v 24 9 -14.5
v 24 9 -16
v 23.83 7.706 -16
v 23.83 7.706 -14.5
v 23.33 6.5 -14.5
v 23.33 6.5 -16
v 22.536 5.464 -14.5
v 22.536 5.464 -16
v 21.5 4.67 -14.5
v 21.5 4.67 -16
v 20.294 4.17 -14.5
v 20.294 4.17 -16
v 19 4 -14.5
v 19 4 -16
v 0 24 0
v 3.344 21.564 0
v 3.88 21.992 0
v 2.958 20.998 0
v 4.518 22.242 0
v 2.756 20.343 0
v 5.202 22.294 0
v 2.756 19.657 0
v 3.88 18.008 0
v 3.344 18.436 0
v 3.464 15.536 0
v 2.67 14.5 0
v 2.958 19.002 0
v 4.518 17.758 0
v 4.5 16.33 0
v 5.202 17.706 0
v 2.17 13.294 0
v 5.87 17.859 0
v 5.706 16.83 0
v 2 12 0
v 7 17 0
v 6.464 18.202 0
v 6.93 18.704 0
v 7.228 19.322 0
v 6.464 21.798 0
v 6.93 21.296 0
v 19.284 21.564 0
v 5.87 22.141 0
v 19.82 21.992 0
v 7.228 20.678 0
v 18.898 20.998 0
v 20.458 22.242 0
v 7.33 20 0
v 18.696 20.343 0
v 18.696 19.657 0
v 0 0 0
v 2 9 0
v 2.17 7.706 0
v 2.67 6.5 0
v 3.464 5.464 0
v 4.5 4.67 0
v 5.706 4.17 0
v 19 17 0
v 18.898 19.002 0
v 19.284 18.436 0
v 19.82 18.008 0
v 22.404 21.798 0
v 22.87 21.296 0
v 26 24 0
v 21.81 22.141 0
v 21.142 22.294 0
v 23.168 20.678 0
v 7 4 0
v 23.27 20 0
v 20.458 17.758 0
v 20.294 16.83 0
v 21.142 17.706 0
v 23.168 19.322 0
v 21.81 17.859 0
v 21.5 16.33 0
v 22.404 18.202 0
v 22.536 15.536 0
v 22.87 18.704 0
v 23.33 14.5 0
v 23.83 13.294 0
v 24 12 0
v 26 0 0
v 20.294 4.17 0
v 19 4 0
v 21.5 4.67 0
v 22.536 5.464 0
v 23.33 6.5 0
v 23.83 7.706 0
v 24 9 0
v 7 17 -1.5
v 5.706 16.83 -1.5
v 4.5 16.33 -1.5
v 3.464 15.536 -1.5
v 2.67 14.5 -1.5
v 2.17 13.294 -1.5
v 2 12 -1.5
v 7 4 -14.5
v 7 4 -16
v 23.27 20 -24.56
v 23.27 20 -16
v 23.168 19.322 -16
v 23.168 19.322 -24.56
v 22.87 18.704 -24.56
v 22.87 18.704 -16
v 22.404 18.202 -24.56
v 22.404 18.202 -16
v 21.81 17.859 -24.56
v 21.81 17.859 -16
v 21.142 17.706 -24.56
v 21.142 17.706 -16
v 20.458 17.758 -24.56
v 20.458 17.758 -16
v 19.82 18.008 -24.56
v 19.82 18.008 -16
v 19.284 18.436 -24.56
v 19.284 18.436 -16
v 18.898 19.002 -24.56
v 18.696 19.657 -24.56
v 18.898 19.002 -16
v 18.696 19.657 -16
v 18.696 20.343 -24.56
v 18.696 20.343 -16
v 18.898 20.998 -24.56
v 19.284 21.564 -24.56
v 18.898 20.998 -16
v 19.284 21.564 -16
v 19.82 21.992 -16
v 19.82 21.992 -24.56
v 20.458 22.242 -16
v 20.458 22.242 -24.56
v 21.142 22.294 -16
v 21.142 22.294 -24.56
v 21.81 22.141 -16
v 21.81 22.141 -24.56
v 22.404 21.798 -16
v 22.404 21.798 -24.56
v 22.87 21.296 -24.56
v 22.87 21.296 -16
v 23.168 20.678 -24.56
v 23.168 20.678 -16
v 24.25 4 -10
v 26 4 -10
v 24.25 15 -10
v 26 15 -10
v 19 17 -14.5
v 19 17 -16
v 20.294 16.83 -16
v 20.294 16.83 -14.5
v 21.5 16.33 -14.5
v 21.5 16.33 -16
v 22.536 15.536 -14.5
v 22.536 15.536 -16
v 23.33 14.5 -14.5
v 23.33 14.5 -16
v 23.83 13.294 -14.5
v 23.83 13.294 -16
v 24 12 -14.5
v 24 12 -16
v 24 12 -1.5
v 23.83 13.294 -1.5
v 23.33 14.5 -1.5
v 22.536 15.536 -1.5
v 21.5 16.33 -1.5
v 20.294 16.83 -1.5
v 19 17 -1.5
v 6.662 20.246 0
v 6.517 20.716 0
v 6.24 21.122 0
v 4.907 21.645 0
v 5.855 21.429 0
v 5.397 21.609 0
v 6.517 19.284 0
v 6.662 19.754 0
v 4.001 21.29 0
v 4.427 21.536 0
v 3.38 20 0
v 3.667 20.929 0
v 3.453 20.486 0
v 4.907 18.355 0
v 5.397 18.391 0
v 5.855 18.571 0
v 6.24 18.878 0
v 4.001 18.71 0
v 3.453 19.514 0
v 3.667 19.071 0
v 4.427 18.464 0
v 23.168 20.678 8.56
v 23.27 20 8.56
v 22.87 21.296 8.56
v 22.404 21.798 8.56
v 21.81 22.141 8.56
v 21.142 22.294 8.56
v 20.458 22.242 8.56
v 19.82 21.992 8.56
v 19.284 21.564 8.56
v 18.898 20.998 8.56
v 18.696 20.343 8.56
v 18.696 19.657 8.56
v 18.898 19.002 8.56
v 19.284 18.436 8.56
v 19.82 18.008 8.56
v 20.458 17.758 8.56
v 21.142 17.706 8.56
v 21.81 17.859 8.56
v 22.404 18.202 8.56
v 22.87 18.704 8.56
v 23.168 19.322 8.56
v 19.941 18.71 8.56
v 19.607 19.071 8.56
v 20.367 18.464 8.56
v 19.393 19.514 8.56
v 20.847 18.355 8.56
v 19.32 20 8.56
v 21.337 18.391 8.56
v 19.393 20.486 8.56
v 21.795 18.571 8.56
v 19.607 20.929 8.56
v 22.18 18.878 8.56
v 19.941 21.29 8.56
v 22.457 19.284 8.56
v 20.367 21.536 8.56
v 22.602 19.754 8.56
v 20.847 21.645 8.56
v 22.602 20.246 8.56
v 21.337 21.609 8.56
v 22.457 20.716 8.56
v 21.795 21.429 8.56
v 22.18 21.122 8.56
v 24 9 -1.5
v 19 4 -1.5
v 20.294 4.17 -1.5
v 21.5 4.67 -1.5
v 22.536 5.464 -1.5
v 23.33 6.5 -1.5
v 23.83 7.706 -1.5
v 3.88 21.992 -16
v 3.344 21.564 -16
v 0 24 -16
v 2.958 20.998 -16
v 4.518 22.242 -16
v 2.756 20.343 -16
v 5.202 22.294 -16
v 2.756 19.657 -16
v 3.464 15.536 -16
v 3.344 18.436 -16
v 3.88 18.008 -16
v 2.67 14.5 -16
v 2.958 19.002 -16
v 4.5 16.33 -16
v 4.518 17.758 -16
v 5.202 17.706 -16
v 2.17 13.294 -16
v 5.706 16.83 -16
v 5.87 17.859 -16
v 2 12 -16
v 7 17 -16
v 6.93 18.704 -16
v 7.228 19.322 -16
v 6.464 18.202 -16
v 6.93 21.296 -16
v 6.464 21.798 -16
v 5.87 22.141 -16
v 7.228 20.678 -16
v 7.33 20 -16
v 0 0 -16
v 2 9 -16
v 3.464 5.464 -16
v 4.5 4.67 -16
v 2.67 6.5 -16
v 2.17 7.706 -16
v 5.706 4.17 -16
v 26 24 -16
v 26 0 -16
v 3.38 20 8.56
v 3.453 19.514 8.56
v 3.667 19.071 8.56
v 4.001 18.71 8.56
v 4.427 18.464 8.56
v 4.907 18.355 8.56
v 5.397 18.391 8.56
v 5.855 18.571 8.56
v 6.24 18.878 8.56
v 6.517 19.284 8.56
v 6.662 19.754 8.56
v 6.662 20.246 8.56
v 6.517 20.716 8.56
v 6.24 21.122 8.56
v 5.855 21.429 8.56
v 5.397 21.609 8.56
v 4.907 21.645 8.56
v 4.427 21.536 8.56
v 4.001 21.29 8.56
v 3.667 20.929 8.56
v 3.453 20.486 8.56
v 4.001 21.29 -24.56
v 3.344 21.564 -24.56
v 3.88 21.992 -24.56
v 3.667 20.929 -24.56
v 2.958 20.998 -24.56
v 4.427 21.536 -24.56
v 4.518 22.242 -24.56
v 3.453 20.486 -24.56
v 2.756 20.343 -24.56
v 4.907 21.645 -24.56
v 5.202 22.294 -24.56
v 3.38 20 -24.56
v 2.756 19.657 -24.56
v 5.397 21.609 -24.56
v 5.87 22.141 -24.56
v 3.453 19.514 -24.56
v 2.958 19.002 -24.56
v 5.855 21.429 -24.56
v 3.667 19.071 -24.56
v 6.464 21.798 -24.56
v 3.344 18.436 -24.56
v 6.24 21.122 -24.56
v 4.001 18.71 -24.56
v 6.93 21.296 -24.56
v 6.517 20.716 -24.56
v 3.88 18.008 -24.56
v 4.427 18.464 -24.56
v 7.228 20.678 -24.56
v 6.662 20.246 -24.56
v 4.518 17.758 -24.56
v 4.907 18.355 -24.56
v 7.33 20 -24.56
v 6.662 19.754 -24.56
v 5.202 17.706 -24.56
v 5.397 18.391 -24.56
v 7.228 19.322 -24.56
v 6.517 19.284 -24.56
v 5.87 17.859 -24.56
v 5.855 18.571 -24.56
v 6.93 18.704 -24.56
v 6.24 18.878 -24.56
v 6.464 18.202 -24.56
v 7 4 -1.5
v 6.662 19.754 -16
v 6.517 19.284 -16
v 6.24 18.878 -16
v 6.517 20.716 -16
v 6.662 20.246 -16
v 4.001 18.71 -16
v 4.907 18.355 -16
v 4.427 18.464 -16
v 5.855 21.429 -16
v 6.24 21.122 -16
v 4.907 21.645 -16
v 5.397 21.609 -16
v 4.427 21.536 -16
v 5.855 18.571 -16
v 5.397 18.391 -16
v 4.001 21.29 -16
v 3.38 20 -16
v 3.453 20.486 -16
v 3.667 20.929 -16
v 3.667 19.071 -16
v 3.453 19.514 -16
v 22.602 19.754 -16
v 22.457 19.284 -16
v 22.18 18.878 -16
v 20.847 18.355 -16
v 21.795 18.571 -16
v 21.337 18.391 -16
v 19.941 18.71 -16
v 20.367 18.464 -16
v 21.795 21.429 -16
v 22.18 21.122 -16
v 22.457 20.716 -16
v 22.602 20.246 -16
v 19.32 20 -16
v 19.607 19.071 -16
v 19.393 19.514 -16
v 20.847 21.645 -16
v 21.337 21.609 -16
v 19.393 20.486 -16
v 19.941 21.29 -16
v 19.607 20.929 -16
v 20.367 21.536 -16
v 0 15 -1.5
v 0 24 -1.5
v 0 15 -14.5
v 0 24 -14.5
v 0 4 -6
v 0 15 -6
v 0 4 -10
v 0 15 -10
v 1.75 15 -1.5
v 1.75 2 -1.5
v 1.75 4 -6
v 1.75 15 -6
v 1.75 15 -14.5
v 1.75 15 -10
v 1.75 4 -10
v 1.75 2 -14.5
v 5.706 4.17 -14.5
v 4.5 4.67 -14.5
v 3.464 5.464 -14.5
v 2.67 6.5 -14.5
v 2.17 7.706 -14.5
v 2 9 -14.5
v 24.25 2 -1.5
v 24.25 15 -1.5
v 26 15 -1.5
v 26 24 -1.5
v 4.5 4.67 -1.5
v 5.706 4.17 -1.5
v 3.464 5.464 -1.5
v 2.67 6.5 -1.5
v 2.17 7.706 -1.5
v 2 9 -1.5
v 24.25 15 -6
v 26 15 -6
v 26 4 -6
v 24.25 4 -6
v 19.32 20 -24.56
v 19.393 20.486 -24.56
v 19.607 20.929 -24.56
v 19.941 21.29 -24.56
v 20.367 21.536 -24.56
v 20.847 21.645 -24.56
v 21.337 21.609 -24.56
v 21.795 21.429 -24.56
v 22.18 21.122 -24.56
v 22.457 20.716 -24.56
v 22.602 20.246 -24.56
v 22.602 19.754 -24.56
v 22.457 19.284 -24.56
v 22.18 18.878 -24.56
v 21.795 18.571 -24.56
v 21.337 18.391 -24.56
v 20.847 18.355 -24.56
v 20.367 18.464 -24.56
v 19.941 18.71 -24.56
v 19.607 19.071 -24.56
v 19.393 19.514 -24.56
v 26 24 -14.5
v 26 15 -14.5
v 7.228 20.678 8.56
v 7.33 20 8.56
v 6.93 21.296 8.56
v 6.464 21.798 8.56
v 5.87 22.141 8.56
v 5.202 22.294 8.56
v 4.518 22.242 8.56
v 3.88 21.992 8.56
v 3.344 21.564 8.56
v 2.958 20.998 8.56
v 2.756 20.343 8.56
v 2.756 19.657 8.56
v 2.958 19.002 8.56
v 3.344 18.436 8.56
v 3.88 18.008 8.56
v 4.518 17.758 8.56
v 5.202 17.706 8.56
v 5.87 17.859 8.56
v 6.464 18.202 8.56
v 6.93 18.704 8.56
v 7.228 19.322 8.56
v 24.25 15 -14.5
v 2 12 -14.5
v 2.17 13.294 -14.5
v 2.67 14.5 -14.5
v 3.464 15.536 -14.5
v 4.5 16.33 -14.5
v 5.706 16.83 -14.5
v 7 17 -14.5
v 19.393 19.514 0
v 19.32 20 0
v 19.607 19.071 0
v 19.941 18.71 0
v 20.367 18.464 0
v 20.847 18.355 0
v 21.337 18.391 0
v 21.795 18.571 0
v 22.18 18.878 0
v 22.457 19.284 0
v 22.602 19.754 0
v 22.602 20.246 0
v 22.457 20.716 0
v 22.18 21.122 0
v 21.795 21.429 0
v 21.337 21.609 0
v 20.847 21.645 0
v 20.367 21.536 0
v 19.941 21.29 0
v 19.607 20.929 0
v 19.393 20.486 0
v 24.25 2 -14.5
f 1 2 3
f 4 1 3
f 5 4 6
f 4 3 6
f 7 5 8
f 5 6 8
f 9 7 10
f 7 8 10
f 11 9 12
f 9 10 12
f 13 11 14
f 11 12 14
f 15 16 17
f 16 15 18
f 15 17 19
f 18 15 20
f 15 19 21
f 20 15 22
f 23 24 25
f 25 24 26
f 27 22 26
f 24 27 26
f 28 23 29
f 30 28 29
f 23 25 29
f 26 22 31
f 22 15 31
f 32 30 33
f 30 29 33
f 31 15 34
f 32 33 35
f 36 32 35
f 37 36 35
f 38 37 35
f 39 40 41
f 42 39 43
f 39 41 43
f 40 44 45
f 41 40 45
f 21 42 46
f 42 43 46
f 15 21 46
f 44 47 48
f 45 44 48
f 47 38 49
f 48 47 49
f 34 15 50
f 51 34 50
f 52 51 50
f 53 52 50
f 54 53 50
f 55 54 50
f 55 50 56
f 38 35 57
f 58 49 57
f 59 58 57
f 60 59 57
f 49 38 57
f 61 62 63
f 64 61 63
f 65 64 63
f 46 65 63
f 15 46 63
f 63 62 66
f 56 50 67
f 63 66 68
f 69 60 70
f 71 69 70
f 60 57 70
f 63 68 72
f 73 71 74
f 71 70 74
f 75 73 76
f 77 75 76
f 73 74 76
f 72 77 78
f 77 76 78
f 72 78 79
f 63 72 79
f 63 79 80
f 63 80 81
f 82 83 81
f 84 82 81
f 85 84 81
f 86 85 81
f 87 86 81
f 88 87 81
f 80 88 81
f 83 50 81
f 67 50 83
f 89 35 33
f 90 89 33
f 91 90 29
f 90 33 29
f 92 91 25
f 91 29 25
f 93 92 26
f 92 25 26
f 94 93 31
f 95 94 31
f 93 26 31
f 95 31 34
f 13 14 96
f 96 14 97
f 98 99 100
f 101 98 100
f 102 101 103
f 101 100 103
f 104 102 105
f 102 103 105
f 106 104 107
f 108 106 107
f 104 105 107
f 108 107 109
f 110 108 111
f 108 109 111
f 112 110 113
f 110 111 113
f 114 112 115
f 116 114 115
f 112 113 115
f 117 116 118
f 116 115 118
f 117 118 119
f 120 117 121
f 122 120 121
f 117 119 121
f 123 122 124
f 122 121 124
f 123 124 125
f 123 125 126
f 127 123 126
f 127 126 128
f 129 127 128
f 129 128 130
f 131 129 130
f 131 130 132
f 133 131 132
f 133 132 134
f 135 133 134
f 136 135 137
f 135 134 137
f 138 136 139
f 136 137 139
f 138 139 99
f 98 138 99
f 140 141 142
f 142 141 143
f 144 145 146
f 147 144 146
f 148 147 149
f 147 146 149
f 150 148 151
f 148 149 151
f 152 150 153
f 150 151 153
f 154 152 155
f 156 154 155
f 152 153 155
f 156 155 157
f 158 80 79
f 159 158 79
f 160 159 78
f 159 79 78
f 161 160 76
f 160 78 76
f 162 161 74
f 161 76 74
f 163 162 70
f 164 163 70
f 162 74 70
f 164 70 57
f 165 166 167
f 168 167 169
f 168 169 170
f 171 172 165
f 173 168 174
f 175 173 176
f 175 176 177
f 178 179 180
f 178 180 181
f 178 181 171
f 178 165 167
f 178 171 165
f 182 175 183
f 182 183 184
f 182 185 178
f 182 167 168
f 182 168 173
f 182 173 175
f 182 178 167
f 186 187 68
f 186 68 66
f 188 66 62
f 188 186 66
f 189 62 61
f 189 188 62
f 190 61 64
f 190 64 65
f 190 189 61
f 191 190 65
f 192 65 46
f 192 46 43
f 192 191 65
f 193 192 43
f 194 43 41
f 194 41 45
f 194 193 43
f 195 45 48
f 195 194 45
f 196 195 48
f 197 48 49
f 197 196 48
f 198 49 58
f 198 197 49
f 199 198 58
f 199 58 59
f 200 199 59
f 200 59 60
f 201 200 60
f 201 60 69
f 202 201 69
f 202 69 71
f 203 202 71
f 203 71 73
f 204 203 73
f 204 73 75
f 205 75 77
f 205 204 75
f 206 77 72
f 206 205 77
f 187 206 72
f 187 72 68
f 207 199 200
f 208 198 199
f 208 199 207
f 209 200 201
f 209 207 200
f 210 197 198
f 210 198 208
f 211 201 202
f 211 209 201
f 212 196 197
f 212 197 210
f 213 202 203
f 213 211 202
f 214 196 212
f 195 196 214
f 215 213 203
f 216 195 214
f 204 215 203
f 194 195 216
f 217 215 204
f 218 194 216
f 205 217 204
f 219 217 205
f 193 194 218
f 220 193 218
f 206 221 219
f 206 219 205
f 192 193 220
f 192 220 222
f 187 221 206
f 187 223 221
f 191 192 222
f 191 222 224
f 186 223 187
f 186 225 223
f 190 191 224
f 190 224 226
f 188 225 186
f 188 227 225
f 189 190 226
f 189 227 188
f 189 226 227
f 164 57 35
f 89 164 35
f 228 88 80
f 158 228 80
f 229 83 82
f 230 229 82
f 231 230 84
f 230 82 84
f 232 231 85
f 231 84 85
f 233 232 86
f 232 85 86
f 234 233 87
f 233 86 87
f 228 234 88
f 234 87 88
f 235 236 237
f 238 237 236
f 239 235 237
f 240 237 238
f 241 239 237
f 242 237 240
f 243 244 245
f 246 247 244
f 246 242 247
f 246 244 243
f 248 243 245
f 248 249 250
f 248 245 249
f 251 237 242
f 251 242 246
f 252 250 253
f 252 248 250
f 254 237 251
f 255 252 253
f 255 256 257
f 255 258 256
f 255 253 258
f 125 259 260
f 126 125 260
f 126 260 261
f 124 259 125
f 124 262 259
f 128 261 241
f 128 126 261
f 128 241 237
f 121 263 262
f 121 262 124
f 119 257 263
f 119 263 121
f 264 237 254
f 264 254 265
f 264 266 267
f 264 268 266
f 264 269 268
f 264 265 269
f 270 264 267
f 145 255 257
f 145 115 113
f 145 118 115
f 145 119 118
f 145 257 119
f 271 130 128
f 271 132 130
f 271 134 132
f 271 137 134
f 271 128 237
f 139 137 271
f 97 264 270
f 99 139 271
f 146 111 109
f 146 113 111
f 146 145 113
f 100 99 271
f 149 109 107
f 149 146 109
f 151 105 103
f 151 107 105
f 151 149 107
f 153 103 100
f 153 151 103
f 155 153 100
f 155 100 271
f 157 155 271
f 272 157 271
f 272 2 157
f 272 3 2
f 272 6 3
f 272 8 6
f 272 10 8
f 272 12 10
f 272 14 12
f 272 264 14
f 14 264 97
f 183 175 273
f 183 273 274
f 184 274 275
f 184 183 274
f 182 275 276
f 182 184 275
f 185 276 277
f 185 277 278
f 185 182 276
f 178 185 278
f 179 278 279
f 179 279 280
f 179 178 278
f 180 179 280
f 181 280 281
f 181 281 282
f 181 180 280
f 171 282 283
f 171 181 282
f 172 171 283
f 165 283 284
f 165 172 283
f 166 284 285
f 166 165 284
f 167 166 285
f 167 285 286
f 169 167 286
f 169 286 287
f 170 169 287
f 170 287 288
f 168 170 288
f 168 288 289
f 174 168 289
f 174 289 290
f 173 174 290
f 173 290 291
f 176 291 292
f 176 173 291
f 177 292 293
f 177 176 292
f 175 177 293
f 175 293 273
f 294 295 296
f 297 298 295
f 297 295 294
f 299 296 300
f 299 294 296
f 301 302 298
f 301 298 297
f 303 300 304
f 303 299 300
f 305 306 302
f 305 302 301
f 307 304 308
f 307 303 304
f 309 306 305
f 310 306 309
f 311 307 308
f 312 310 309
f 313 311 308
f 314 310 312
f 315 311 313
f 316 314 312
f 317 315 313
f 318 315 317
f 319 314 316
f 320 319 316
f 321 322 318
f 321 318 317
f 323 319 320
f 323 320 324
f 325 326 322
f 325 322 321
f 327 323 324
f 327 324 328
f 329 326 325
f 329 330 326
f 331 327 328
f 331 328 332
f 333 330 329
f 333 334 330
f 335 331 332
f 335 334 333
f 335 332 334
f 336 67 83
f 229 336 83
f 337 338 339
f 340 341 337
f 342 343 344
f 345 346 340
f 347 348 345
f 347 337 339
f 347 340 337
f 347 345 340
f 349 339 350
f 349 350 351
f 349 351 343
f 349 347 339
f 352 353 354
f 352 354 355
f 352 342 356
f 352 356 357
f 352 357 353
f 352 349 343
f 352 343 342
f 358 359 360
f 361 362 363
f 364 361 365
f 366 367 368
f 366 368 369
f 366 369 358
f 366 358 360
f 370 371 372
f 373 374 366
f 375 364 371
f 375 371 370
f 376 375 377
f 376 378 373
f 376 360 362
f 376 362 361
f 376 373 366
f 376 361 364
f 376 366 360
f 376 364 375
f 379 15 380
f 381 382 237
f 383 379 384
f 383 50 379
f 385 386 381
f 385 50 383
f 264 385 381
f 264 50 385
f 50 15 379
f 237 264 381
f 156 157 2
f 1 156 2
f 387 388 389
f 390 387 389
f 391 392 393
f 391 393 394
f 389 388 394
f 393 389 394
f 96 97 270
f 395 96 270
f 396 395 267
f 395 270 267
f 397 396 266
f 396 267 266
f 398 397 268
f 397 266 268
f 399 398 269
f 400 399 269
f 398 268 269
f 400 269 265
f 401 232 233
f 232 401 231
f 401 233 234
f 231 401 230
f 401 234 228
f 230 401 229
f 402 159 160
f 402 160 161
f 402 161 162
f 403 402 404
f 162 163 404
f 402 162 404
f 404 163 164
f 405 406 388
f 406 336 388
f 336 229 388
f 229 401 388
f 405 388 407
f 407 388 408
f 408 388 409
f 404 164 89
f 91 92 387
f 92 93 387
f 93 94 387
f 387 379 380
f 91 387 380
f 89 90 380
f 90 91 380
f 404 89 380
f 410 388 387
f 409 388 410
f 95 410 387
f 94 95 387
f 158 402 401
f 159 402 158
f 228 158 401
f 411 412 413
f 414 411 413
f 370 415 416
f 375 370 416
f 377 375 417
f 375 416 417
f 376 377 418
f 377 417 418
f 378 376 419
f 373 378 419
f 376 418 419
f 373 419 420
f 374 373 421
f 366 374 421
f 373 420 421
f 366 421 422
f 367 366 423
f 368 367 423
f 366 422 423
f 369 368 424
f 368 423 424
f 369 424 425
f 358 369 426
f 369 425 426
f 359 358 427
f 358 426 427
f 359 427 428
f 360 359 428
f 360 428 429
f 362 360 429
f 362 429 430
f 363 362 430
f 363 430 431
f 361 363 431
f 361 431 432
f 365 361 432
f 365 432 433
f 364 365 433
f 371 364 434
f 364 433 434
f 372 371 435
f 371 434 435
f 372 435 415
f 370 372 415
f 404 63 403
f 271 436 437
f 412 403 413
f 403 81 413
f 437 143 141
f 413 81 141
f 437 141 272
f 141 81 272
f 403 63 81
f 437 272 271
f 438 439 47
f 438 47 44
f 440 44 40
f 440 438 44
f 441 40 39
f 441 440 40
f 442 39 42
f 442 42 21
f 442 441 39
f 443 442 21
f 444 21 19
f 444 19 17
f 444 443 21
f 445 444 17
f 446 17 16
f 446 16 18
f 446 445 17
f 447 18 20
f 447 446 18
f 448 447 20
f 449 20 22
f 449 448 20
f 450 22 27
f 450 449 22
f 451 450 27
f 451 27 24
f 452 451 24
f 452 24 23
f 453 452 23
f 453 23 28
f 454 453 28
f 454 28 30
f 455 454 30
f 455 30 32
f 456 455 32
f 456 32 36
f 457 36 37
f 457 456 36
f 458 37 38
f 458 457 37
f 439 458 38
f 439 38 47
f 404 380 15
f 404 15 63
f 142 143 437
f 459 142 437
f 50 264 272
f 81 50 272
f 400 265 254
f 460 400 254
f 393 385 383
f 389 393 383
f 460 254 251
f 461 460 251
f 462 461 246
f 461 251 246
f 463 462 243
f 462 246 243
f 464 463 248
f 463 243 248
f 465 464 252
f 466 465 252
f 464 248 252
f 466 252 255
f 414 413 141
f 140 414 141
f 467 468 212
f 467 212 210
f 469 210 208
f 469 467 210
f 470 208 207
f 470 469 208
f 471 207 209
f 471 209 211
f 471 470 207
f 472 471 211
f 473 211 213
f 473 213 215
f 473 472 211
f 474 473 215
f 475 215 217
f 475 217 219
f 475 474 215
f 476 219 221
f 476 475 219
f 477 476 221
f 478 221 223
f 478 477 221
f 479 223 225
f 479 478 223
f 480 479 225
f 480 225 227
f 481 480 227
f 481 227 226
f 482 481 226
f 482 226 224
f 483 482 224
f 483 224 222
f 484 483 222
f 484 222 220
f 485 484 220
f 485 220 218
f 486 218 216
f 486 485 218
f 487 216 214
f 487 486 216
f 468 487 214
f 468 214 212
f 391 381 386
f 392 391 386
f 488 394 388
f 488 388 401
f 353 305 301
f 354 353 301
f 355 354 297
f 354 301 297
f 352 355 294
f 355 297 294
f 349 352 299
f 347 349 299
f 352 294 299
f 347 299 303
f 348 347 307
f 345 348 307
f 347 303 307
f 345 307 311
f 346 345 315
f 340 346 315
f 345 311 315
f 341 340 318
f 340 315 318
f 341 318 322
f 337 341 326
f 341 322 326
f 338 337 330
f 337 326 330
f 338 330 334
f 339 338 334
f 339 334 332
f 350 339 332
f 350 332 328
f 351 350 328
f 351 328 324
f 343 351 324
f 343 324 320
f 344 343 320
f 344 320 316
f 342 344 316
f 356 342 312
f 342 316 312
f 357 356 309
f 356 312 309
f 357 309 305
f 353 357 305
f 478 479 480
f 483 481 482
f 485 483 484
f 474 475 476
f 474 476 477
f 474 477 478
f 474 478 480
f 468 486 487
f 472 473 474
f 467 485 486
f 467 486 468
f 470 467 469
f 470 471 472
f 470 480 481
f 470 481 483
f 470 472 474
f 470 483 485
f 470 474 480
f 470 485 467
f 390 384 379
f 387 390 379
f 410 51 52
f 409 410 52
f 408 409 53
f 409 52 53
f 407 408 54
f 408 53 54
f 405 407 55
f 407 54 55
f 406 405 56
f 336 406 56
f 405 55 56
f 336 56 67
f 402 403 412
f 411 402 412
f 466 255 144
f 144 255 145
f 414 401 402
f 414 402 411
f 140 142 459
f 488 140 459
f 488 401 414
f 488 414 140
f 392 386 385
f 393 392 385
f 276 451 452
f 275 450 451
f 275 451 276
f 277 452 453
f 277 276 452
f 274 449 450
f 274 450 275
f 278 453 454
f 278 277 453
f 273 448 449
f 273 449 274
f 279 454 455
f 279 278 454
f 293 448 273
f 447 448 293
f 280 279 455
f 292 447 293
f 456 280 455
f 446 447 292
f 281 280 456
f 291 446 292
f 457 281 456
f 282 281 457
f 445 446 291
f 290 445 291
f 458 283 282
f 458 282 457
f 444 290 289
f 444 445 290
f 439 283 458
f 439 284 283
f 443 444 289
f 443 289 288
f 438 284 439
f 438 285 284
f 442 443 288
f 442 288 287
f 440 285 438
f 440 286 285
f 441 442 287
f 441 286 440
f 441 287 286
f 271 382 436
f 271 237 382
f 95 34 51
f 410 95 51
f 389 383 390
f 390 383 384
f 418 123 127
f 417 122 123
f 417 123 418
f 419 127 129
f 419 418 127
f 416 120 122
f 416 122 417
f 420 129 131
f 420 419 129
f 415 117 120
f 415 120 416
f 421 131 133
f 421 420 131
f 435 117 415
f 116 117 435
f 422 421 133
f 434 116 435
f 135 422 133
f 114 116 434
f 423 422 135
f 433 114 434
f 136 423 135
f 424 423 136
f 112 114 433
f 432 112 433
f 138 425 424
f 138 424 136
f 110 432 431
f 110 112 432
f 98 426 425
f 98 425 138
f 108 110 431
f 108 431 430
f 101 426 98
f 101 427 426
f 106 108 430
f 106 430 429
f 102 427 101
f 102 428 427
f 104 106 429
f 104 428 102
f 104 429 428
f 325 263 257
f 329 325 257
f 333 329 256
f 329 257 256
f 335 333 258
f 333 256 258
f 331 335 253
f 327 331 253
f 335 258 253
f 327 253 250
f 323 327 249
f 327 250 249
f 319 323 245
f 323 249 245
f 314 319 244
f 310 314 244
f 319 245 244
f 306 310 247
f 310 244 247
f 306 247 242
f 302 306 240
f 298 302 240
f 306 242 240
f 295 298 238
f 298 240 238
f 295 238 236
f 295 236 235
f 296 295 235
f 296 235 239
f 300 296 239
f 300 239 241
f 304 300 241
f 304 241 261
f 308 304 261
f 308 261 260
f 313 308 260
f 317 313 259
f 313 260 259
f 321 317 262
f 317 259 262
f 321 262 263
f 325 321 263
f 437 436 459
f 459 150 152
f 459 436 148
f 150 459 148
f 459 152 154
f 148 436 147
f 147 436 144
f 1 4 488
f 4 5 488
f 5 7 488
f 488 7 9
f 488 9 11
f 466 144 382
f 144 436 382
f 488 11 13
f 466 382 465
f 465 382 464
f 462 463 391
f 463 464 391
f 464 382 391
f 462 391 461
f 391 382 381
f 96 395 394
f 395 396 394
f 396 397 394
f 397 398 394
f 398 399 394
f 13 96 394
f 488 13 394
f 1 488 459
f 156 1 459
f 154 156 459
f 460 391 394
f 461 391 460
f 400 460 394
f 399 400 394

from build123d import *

# Parameters (mm, degrees)
SKETCH2_W           = 26
SKETCH2_H           = 16
BOSS_EXTRUDE1_DEPTH = 2
SKETCH3_W           = 26
SKETCH3_H           = 16
SKETCH3_W_2         = 22.5
SKETCH3_H_2         = 13
BOSS_EXTRUDE2_DEPTH = 22
CUT_EXTRUDE1_REACH  = 40.833
CUT_EXTRUDE2_REACH  = 40.833
CUT_EXTRUDE3_REACH  = 40.833
CUT_EXTRUDE4_REACH  = 40.833
SKETCH10_R          = 2.3
BOSS_EXTRUDE3_DEPTH = 8.56
BOSS_EXTRUDE4_START = 8.56
SKETCH11_R          = 2.3
BOSS_EXTRUDE4_DEPTH = 8.56
SKETCH12_R          = 1.65
CUT_EXTRUDE5_DEPTH  = 8.56
CUT_EXTRUDE6_START  = -8.56
SKETCH13_R          = 1.65
CUT_EXTRUDE6_DEPTH  = 8.56


with BuildPart() as part:
    # Sketch2 → Boss-Extrude1 (new body)
    with BuildSketch(Plane(origin=(0, 0, 0), x_dir=(1, 0, 0), z_dir=(0, 1, 0))):
        with Locations((13, 8)):
            Rectangle(SKETCH2_W, SKETCH2_H)
    extrude(amount=BOSS_EXTRUDE1_DEPTH)

    # Sketch3 → Boss-Extrude2 (add)
    with BuildSketch(Plane(origin=(0, 2, 0), x_dir=(1, 0, 0), z_dir=(0, 1, 0))):
        with Locations((13, 8)):
            Rectangle(SKETCH3_W, SKETCH3_H)
        with Locations((13, 8)):
            Rectangle(SKETCH3_W_2, SKETCH3_H_2, mode=Mode.SUBTRACT)
    extrude(amount=BOSS_EXTRUDE2_DEPTH)

    # Sketch6 → Cut-Extrude1 (cut, up to next)
    with BuildSketch(Plane.ZY, mode=Mode.PRIVATE) as cut_extrude1_sk1:
        Polygon((-14.5, 24), (-14.5, 15), (-10, 15), (-10, 4), (-6, 4), (-6, 15), (-1.5, 15), (-1.5, 24), align=None)
    cut_extrude1_tool1 = extrude(cut_extrude1_sk1.sketch, amount=-CUT_EXTRUDE1_REACH, mode=Mode.PRIVATE) & part.part
    add(cut_extrude1_tool1.solids().sort_by_distance((0, 16.767081, -8))[0], mode=Mode.SUBTRACT)

    # Sketch7 → Cut-Extrude2 (cut, up to next)
    with BuildSketch(Plane(origin=(26, 0, 0), x_dir=(0, 0, -1), z_dir=(1, 0, 0)), mode=Mode.PRIVATE) as cut_extrude2_sk1:
        Polygon((1.5, 24), (1.5, 15), (6, 15), (6, 4), (10, 4), (10, 15), (14.5, 15), (14.5, 24), align=None)
    cut_extrude2_tool1 = extrude(cut_extrude2_sk1.sketch, amount=-CUT_EXTRUDE2_REACH, mode=Mode.PRIVATE) & part.part
    add(cut_extrude2_tool1.solids().sort_by_distance((26, 16.767081, -8))[0], mode=Mode.SUBTRACT)

    # Sketch8 → Cut-Extrude3 (cut, up to next)
    with BuildSketch(Plane(origin=(0, 0, -16), x_dir=(-1, 0, 0), z_dir=(0, 0, -1)), mode=Mode.PRIVATE) as cut_extrude3_sk1:
        with BuildLine():
            Line((-24, 12), (-24, 9))
            ThreePointArc((-24, 9), (-22.535533906, 5.464466094), (-19, 4))
            Line((-19, 4), (-7, 4))
            ThreePointArc((-7, 4), (-3.464466094, 5.464466094), (-2, 9))
            Line((-2, 9), (-2, 12))
            ThreePointArc((-2, 12), (-3.464466094, 15.535533906), (-7, 17))
            Line((-7, 17), (-19, 17))
            ThreePointArc((-19, 17), (-22.535533906, 15.535533906), (-24, 12))
        make_face()
    cut_extrude3_tool1 = extrude(cut_extrude3_sk1.sketch, amount=-CUT_EXTRUDE3_REACH, mode=Mode.PRIVATE) & part.part
    add(cut_extrude3_tool1.solids().sort_by_distance((13, 10.5, -16))[0], mode=Mode.SUBTRACT)

    # Sketch9 → Cut-Extrude4 (cut, up to next)
    with BuildSketch(Plane.XY, mode=Mode.PRIVATE) as cut_extrude4_sk1:
        with BuildLine():
            Line((2, 12), (2, 9))
            ThreePointArc((2, 9), (3.464466094, 5.464466094), (7, 4))
            Line((7, 4), (19, 4))
            ThreePointArc((19, 4), (22.535533906, 5.464466094), (24, 9))
            Line((24, 9), (24, 12))
            ThreePointArc((24, 12), (22.535533906, 15.535533906), (19, 17))
            Line((19, 17), (7, 17))
            ThreePointArc((7, 17), (3.464466094, 15.535533906), (2, 12))
        make_face()
    cut_extrude4_tool1 = extrude(cut_extrude4_sk1.sketch, amount=-CUT_EXTRUDE4_REACH, mode=Mode.PRIVATE) & part.part
    add(cut_extrude4_tool1.solids().sort_by_distance((13, 10.5, 0))[0], mode=Mode.SUBTRACT)

    # Sketch10 → Boss-Extrude3 (add)
    with BuildSketch(Plane(origin=(0, 0, -16), x_dir=(-1, 0, 0), z_dir=(0, 0, -1))):
        with Locations(Location((-20.97, 20, 0), (0, 0, 180))):
            Circle(SKETCH10_R)
        with Locations(Location((-5.03, 20, 0), (0, 0, 180))):
            Circle(SKETCH10_R)
    extrude(amount=BOSS_EXTRUDE3_DEPTH)

    # Sketch11 → Boss-Extrude4 (add)
    with BuildSketch(Plane.XY.offset(BOSS_EXTRUDE4_START)):
        with Locations((5.03, 20)):
            Circle(SKETCH11_R)
        with Locations((20.97, 20)):
            Circle(SKETCH11_R)
    extrude(amount=-BOSS_EXTRUDE4_DEPTH)

    # Sketch12 → Cut-Extrude5 (cut)
    with BuildSketch(Plane(origin=(0, 0, -24.56), x_dir=(-1, 0, 0), z_dir=(0, 0, -1))):
        with Locations((-20.97, 20)):
            Circle(SKETCH12_R)
        with Locations((-5.03, 20)):
            Circle(SKETCH12_R)
    extrude(amount=-CUT_EXTRUDE5_DEPTH, mode=Mode.SUBTRACT)

    # Sketch13 → Cut-Extrude6 (cut)
    with BuildSketch(Plane.XY.offset(8.56).offset(CUT_EXTRUDE6_START)):
        with Locations(Location((5.03, 20, 0), (0, 0, 180))):
            Circle(SKETCH13_R)
        with Locations(Location((20.97, 20, 0), (0, 0, 180))):
            Circle(SKETCH13_R)
    extrude(amount=CUT_EXTRUDE6_DEPTH, mode=Mode.SUBTRACT)


solid = part.part
